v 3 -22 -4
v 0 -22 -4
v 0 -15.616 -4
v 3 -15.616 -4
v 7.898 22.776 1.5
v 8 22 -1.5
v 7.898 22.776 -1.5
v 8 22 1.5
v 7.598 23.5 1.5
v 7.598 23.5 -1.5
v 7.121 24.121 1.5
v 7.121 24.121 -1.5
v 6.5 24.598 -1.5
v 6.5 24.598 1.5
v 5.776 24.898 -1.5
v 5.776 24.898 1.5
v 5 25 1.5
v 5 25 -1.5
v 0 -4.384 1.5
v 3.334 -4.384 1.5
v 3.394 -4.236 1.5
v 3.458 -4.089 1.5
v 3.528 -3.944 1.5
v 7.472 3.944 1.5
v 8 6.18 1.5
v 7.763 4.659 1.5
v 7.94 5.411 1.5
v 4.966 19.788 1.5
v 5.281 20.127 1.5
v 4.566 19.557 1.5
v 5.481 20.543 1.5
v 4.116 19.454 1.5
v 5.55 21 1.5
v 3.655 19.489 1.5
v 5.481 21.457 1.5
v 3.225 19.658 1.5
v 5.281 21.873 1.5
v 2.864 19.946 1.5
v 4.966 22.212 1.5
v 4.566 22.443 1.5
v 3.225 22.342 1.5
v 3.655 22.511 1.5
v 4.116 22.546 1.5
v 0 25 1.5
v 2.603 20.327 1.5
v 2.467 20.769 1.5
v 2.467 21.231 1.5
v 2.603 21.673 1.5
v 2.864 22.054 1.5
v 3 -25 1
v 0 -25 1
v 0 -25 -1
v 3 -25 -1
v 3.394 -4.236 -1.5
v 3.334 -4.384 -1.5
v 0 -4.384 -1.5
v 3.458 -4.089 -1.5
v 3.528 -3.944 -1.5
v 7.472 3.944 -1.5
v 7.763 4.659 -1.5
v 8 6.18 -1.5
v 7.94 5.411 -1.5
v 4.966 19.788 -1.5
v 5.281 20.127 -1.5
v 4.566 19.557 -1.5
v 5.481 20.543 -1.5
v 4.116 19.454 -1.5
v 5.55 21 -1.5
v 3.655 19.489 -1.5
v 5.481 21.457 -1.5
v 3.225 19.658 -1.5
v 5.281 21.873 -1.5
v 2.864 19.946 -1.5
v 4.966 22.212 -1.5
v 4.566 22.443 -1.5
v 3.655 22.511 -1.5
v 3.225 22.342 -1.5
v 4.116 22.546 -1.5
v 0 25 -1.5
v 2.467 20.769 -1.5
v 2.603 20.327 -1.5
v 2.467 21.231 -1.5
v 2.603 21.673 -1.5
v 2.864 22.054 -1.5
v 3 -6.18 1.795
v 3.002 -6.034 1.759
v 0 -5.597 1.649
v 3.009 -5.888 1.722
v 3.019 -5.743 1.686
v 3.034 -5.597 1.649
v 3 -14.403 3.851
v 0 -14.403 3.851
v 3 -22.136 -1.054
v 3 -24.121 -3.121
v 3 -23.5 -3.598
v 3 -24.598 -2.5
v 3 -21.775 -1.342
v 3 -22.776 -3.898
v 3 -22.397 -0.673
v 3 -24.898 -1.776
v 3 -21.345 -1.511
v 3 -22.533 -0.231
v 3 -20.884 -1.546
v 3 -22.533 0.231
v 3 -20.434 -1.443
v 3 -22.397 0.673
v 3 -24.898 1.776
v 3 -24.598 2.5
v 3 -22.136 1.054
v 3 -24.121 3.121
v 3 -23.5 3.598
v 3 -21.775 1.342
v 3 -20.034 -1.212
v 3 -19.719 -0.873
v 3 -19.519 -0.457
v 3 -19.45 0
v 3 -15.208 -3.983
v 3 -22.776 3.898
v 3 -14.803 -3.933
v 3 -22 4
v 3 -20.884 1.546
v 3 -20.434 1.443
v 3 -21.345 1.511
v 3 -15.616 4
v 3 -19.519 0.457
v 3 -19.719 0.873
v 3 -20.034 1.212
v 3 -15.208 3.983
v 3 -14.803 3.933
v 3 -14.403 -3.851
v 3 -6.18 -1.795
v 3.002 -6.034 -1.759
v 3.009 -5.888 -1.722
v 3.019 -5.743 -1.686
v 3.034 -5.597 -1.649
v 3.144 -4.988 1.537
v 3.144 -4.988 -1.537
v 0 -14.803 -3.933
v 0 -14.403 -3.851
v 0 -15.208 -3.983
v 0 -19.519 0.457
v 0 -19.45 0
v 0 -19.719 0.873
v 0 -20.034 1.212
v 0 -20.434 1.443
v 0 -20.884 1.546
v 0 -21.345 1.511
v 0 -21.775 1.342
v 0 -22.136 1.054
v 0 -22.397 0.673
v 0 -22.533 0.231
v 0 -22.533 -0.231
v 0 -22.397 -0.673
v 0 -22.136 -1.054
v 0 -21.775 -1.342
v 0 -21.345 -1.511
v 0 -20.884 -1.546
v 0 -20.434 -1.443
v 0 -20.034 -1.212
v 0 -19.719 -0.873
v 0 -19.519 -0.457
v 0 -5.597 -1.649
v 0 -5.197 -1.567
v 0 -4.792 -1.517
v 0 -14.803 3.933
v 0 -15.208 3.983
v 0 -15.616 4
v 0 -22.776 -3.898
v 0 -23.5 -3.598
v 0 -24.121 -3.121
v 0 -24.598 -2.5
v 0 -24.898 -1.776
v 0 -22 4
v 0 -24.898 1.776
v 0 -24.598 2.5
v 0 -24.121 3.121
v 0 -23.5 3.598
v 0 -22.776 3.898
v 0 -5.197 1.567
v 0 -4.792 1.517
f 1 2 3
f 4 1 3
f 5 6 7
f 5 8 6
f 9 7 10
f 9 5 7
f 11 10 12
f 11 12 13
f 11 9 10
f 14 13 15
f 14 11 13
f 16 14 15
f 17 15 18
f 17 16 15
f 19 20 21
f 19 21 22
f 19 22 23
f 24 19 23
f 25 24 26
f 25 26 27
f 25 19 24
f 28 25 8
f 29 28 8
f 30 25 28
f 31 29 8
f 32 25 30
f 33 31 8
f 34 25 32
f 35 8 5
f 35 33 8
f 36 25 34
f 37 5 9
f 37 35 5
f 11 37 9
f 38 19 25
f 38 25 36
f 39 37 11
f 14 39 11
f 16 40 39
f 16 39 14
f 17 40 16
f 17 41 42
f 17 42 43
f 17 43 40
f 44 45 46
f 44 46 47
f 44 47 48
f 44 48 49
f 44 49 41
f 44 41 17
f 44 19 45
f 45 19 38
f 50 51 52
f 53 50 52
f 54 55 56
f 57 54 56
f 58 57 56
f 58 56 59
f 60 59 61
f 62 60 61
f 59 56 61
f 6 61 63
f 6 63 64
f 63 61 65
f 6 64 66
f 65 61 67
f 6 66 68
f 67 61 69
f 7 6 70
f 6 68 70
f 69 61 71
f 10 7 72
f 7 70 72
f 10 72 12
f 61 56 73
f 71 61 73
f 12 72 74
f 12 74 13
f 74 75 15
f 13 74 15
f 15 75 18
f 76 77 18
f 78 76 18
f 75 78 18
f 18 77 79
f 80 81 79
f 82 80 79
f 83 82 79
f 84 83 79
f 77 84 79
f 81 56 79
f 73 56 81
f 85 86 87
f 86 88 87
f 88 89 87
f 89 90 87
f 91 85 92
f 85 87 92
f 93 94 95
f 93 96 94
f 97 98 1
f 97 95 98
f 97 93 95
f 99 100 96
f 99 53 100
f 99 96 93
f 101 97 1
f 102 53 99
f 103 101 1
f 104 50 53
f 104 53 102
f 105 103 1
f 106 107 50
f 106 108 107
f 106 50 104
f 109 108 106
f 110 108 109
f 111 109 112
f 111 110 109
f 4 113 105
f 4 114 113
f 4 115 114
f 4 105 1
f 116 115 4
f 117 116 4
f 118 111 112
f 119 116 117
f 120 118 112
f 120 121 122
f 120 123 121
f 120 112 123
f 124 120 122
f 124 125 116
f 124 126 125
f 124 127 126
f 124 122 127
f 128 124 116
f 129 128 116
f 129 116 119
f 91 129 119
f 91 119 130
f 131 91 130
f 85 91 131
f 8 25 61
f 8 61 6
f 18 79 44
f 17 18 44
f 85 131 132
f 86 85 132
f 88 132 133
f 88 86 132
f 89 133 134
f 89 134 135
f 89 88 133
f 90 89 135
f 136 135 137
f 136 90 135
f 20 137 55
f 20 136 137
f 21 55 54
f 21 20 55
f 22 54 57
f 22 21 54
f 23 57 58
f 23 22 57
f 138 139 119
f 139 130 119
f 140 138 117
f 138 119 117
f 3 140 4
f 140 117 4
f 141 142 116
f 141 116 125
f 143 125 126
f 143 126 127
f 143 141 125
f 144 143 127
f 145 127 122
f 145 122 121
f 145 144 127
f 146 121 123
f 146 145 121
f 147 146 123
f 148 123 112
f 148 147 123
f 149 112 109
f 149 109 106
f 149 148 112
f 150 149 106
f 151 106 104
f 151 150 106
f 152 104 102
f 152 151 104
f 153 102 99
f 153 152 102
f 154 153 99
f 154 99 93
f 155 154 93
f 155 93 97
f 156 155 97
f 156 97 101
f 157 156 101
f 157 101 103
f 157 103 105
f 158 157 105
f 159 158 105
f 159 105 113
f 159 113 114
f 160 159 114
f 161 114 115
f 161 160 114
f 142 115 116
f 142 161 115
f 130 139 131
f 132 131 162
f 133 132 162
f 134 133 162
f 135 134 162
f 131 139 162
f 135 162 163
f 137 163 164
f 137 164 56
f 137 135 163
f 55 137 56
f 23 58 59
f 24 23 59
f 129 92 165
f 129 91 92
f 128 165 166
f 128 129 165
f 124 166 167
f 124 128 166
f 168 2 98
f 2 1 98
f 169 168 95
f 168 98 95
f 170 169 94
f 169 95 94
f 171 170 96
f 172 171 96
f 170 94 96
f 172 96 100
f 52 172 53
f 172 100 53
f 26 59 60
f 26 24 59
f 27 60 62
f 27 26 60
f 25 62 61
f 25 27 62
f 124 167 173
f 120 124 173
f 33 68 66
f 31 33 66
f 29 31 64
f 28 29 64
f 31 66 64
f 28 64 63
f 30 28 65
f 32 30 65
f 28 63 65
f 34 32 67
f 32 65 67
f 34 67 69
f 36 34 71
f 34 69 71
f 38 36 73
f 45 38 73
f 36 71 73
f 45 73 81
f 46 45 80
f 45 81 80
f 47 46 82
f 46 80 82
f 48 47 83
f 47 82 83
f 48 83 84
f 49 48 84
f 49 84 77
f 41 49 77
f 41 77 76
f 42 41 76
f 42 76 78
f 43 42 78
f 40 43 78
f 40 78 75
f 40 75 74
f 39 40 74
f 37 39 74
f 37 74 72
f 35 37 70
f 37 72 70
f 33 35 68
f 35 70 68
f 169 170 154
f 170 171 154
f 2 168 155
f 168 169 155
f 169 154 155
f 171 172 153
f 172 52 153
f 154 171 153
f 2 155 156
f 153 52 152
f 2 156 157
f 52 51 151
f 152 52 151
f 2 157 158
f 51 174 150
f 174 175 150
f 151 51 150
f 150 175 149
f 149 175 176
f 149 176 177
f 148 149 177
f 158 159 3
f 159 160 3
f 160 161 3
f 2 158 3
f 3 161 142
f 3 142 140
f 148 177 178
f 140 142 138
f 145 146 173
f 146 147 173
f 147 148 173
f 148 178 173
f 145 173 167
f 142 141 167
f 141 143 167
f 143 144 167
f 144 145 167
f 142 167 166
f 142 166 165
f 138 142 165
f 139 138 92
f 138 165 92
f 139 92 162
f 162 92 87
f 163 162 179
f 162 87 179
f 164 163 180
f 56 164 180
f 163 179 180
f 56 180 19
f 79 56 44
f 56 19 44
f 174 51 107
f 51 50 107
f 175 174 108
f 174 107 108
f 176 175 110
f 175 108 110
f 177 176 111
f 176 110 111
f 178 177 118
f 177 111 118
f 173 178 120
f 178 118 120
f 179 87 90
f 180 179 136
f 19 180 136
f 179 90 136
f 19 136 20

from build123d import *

# Parameters (mm, degrees)
F0_R     = 1.55
F0_W     = 30
F0_H     = 3
F1_DEPTH = 3
F2_W     = 30
F2_H     = 3
F3_DEPTH = 5
F4_R     = 1.55
F5_DEPTH = 3
F6_R     = 3
F7_F1_R  = 5
F7_F2_R  = 5
F7_F3_R  = 5
F7_F4_R  = 5
F7_F5_R  = 5
F7_F6_R  = 5


with BuildPart() as f1:
    # F0 (on Right) → F1 (new body)
    with BuildSketch(Plane.YZ):
        Polygon((-15, 4), (-25, 4), (-25, -4), (-15, -4), (-5, -1.5), (-5, 1.5), align=None)
        with Locations((-21, 0)):
            Circle(F0_R, mode=Mode.SUBTRACT)
        with Locations((10, 0)):
            Rectangle(F0_W, F0_H)
    extrude(amount=F1_DEPTH)

    # F2 (on face) → F3 (join)
    with BuildSketch(Plane.YZ.offset(3)):
        with Locations((10, 0)):
            Rectangle(F2_W, F2_H)
    extrude(amount=F3_DEPTH)

    # F4 (on face) → F5 (cut, through all)
    with BuildSketch(Plane(origin=(0, 0, -1.5), x_dir=(1, 0, 0), z_dir=(0, 0, -1))):
        Polygon((8, 5), (3, 5), (8, -5), align=None)
        with Locations((4, -21)):
            Circle(F4_R)
    extrude(amount=-F5_DEPTH, mode=Mode.SUBTRACT)

    # F6
    f6_edges = [f1.edges().sort_by_distance(p)[0] for p in [
        (1.5, -25, 4),
        (1.5, -25, -4),
        (8, 25, 0),
    ]]
    fillet(f6_edges, radius=F6_R)

    # F7: fillet of radius 5 on 6 edges, made by hand

    # F7_f1
    f7_f1_edges = [f1.edges().sort_by_distance(p)[0] for p in [
        (1.5, -15, 4),
    ]]
    fillet(f7_f1_edges, radius=F7_F1_R)

    # F7_f2
    f7_f2_edges = [f1.edges().sort_by_distance(p)[0] for p in [
        (1.5, -5, 1.5),
    ]]
    fillet(f7_f2_edges, radius=F7_F2_R)

    # F7_f3
    f7_f3_edges = [f1.edges().sort_by_distance(p)[0] for p in [
        (3, -5, 0.019016066),
    ]]
    fillet(f7_f3_edges, radius=F7_F3_R)

    # F7_f4
    f7_f4_edges = [f1.edges().sort_by_distance(p)[0] for p in [
        (1.5, -15, -4),
    ]]
    fillet(f7_f4_edges, radius=F7_F4_R)

    # F7_f5
    f7_f5_edges = [f1.edges().sort_by_distance(p)[0] for p in [
        (1.5706586412, -5, -1.5),
    ]]
    fillet(f7_f5_edges, radius=F7_F5_R)

    # F7_f6
    f7_f6_edges = [f1.edges().sort_by_distance(p)[0] for p in [
        (8, 5, 0),
    ]]
    fillet(f7_f6_edges, radius=F7_F6_R)


solid = f1.part
